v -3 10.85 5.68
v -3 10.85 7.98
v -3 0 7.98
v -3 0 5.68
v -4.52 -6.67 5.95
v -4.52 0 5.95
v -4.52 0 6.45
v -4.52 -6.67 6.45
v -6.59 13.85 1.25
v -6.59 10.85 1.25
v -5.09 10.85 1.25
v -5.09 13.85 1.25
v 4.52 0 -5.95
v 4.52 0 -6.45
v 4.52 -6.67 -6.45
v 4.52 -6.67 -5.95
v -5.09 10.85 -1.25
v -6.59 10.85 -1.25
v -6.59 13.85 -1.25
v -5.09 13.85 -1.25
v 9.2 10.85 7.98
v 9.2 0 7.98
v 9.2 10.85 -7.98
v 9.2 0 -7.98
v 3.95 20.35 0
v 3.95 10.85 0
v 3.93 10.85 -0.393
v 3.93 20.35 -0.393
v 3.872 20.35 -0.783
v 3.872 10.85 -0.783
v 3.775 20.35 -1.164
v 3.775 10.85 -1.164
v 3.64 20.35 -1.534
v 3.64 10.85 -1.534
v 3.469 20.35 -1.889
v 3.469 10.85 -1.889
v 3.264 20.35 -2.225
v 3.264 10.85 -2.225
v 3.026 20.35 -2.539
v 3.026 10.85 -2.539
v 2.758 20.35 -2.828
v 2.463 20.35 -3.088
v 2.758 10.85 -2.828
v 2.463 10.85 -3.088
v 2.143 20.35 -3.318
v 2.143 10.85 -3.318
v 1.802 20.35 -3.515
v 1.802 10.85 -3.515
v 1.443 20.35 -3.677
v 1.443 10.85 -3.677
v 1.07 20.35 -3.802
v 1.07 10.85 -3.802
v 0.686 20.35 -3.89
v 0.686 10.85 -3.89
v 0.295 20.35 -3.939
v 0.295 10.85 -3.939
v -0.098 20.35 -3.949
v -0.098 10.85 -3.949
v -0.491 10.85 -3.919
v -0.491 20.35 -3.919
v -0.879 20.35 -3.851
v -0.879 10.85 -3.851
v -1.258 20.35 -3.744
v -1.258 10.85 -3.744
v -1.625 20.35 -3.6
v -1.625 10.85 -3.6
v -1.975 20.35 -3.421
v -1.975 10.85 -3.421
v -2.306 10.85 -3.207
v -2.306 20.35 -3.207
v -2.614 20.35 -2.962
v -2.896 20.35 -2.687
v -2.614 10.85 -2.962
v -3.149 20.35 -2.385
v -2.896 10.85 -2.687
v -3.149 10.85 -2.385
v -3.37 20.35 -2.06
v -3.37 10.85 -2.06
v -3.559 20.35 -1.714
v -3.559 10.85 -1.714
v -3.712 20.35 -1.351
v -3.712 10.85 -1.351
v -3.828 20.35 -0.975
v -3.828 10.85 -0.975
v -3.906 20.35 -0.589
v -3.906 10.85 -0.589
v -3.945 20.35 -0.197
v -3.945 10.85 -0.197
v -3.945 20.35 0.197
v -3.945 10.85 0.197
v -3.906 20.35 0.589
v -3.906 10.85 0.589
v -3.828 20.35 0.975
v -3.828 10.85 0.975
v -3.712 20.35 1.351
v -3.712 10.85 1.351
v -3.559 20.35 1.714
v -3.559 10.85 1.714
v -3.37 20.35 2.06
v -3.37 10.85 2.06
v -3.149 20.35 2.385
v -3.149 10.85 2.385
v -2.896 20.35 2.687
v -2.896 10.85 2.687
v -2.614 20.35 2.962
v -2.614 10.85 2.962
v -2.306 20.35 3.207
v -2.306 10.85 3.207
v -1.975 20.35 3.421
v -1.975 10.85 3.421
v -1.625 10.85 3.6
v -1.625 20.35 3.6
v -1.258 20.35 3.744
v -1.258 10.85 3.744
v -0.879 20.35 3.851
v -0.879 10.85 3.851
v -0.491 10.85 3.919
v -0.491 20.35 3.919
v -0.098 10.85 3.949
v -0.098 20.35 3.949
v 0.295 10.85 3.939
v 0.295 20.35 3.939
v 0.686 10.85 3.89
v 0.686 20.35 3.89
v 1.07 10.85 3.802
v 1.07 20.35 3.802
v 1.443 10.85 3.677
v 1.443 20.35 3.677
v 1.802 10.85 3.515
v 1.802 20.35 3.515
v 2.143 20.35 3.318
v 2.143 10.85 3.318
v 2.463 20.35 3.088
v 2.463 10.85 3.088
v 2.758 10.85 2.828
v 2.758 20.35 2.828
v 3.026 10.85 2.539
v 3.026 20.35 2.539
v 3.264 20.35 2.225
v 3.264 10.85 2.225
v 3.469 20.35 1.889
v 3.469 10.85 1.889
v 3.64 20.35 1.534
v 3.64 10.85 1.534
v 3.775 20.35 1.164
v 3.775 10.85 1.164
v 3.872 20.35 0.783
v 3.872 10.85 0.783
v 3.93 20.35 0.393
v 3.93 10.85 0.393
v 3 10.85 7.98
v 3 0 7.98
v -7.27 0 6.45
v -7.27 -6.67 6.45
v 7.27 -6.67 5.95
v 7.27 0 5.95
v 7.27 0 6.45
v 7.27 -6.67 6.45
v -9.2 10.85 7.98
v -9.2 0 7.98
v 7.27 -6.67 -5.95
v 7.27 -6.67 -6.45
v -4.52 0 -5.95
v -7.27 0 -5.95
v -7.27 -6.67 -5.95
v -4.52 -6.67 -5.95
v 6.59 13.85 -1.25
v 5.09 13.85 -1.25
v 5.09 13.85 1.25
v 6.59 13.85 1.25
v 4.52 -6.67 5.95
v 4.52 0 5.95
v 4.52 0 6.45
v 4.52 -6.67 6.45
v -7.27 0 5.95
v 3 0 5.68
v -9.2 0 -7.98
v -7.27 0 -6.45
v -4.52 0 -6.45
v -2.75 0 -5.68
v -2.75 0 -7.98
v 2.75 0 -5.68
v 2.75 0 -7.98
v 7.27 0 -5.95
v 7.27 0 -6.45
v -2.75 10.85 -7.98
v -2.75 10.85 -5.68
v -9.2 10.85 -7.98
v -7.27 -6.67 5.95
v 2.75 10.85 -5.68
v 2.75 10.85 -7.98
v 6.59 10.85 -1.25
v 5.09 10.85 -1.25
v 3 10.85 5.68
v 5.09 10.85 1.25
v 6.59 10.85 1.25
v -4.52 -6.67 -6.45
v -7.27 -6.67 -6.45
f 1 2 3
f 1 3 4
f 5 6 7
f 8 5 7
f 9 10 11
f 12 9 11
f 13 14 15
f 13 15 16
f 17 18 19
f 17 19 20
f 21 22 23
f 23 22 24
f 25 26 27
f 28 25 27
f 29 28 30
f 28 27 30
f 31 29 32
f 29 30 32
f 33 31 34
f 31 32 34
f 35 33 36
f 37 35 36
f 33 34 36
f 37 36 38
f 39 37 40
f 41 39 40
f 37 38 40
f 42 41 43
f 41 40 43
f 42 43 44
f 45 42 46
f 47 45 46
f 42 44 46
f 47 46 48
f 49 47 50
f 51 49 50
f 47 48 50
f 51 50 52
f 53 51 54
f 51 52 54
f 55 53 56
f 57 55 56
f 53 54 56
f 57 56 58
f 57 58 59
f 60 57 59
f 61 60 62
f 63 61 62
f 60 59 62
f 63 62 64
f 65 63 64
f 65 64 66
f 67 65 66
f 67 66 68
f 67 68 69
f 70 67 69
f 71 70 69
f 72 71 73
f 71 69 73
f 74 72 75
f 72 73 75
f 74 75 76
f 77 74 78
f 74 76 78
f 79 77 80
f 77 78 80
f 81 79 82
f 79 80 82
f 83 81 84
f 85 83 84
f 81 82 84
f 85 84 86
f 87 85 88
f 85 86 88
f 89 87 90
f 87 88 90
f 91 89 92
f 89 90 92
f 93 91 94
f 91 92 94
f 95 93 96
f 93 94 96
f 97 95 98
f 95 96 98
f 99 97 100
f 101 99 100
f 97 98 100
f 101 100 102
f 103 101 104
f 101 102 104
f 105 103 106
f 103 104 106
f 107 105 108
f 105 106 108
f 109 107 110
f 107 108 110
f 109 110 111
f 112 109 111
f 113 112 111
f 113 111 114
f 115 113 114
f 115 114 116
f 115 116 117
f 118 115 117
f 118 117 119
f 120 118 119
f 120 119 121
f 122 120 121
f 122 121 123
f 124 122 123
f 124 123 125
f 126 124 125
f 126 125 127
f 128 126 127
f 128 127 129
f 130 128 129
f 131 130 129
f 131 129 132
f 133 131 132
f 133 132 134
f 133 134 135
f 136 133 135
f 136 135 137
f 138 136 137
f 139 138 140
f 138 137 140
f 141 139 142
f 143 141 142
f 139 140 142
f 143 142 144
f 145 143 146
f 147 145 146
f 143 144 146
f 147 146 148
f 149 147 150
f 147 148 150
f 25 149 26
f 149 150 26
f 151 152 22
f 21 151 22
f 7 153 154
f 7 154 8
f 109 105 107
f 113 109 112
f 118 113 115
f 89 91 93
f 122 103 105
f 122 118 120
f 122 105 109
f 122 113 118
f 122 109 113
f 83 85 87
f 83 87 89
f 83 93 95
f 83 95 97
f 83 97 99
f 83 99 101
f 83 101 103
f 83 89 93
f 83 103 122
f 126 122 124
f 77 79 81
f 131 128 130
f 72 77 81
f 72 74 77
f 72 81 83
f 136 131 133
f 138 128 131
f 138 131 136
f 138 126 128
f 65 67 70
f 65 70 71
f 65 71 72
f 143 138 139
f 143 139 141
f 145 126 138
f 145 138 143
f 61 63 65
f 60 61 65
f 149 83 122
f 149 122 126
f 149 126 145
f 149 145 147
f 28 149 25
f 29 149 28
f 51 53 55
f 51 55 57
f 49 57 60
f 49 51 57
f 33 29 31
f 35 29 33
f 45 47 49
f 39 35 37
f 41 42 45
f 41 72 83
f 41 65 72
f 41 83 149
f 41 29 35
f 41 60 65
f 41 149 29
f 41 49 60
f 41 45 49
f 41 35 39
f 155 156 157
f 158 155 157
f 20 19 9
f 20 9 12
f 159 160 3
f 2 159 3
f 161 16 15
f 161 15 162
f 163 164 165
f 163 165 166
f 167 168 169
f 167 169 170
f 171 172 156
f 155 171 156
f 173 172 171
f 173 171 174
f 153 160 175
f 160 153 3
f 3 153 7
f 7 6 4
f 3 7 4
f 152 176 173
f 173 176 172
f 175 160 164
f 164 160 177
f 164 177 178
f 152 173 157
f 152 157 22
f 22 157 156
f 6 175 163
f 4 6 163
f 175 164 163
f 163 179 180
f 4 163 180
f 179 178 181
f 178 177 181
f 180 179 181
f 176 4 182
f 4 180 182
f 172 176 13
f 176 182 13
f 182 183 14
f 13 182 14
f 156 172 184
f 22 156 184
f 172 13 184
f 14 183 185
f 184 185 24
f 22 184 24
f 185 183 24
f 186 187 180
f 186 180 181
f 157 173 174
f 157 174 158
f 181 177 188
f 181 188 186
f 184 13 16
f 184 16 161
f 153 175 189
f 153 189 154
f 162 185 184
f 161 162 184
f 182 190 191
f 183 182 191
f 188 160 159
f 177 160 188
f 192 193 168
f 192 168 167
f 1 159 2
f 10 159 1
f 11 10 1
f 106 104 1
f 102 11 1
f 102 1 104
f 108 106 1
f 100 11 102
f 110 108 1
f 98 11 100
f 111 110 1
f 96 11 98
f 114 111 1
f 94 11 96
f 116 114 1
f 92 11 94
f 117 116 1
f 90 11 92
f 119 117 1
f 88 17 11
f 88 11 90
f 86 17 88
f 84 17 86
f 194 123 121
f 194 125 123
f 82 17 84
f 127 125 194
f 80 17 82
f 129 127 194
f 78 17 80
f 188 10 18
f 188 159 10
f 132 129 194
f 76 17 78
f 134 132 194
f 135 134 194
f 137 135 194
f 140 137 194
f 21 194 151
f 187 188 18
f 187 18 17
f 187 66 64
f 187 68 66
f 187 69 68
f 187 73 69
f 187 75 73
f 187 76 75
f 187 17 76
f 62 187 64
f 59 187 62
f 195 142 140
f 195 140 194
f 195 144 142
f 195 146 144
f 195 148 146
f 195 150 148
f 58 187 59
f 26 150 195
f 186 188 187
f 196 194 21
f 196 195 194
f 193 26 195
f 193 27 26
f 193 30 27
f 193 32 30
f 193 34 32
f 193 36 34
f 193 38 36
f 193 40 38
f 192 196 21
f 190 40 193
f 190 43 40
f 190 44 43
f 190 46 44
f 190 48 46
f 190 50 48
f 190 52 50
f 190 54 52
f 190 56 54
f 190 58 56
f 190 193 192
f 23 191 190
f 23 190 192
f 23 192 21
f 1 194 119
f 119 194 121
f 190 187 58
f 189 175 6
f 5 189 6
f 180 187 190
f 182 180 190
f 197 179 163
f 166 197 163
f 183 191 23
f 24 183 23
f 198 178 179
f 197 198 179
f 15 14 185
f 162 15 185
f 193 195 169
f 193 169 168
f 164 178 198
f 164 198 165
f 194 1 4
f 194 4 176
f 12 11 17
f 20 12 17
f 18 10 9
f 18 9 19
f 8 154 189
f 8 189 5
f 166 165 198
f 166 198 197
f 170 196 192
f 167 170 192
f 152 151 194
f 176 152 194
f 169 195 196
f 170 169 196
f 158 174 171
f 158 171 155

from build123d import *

# Parameters (mm, degrees)
SKETCH1_W           = 18.4
SKETCH1_H           = 15.96
BOSS_EXTRUDE1_DEPTH = 10.85
SKETCH2_W           = 2.75
SKETCH2_H           = 0.5
BOSS_EXTRUDE2_DEPTH = 6.67
SKETCH3_W           = 5.5
SKETCH3_H           = 2.3
SKETCH3_W_2         = 6
CUT_EXTRUDE1_DEPTH  = 18.52
SKETCH4_R           = 3.95
BOSS_EXTRUDE3_DEPTH = 9.5
SKETCH5_W           = 1.5
SKETCH5_H           = 2.5
BOSS_EXTRUDE4_DEPTH = 3


with BuildPart() as part:
    # Sketch1 → Boss-Extrude1 (new body)
    with BuildSketch(Plane(origin=(0, 0, 0), x_dir=(1, 0, 0), z_dir=(0, 1, 0))):
        Rectangle(SKETCH1_W, SKETCH1_H)
    extrude(amount=BOSS_EXTRUDE1_DEPTH)

    # Sketch2 → Boss-Extrude2 (add)
    with BuildSketch(Plane.XZ):
        with Locations((-5.895, -6.2)):
            Rectangle(SKETCH2_W, SKETCH2_H)
        with Locations((-5.895, 6.2)):
            Rectangle(SKETCH2_W, SKETCH2_H)
        with Locations((5.895, -6.2)):
            Rectangle(SKETCH2_W, SKETCH2_H)
        with Locations((5.895, 6.2)):
            Rectangle(SKETCH2_W, SKETCH2_H)
    extrude(amount=BOSS_EXTRUDE2_DEPTH)

    # Sketch3 → Cut-Extrude1 (cut, through all)
    with BuildSketch(Plane(origin=(0, 10.85, 0), x_dir=(1, 0, 0), z_dir=(0, 1, 0))):
        with Locations((0, 6.83)):
            Rectangle(SKETCH3_W, SKETCH3_H)
        with Locations((0, -6.83)):
            Rectangle(SKETCH3_W_2, SKETCH3_H)
    extrude(amount=-CUT_EXTRUDE1_DEPTH, mode=Mode.SUBTRACT)

    # Sketch4 → Boss-Extrude3 (add)
    with BuildSketch(Plane(origin=(0, 10.85, 0), x_dir=(1, 0, 0), z_dir=(0, 1, 0))):
        Circle(SKETCH4_R)
    extrude(amount=BOSS_EXTRUDE3_DEPTH)

    # Sketch5 → Boss-Extrude4 (add)
    with BuildSketch(Plane(origin=(0, 10.85, 0), x_dir=(1, 0, 0), z_dir=(0, 1, 0))):
        with Locations((-5.84, 0)):
            Rectangle(SKETCH5_W, SKETCH5_H)
        with Locations((5.84, 0)):
            Rectangle(SKETCH5_W, SKETCH5_H)
    extrude(amount=BOSS_EXTRUDE4_DEPTH)


solid = part.part
